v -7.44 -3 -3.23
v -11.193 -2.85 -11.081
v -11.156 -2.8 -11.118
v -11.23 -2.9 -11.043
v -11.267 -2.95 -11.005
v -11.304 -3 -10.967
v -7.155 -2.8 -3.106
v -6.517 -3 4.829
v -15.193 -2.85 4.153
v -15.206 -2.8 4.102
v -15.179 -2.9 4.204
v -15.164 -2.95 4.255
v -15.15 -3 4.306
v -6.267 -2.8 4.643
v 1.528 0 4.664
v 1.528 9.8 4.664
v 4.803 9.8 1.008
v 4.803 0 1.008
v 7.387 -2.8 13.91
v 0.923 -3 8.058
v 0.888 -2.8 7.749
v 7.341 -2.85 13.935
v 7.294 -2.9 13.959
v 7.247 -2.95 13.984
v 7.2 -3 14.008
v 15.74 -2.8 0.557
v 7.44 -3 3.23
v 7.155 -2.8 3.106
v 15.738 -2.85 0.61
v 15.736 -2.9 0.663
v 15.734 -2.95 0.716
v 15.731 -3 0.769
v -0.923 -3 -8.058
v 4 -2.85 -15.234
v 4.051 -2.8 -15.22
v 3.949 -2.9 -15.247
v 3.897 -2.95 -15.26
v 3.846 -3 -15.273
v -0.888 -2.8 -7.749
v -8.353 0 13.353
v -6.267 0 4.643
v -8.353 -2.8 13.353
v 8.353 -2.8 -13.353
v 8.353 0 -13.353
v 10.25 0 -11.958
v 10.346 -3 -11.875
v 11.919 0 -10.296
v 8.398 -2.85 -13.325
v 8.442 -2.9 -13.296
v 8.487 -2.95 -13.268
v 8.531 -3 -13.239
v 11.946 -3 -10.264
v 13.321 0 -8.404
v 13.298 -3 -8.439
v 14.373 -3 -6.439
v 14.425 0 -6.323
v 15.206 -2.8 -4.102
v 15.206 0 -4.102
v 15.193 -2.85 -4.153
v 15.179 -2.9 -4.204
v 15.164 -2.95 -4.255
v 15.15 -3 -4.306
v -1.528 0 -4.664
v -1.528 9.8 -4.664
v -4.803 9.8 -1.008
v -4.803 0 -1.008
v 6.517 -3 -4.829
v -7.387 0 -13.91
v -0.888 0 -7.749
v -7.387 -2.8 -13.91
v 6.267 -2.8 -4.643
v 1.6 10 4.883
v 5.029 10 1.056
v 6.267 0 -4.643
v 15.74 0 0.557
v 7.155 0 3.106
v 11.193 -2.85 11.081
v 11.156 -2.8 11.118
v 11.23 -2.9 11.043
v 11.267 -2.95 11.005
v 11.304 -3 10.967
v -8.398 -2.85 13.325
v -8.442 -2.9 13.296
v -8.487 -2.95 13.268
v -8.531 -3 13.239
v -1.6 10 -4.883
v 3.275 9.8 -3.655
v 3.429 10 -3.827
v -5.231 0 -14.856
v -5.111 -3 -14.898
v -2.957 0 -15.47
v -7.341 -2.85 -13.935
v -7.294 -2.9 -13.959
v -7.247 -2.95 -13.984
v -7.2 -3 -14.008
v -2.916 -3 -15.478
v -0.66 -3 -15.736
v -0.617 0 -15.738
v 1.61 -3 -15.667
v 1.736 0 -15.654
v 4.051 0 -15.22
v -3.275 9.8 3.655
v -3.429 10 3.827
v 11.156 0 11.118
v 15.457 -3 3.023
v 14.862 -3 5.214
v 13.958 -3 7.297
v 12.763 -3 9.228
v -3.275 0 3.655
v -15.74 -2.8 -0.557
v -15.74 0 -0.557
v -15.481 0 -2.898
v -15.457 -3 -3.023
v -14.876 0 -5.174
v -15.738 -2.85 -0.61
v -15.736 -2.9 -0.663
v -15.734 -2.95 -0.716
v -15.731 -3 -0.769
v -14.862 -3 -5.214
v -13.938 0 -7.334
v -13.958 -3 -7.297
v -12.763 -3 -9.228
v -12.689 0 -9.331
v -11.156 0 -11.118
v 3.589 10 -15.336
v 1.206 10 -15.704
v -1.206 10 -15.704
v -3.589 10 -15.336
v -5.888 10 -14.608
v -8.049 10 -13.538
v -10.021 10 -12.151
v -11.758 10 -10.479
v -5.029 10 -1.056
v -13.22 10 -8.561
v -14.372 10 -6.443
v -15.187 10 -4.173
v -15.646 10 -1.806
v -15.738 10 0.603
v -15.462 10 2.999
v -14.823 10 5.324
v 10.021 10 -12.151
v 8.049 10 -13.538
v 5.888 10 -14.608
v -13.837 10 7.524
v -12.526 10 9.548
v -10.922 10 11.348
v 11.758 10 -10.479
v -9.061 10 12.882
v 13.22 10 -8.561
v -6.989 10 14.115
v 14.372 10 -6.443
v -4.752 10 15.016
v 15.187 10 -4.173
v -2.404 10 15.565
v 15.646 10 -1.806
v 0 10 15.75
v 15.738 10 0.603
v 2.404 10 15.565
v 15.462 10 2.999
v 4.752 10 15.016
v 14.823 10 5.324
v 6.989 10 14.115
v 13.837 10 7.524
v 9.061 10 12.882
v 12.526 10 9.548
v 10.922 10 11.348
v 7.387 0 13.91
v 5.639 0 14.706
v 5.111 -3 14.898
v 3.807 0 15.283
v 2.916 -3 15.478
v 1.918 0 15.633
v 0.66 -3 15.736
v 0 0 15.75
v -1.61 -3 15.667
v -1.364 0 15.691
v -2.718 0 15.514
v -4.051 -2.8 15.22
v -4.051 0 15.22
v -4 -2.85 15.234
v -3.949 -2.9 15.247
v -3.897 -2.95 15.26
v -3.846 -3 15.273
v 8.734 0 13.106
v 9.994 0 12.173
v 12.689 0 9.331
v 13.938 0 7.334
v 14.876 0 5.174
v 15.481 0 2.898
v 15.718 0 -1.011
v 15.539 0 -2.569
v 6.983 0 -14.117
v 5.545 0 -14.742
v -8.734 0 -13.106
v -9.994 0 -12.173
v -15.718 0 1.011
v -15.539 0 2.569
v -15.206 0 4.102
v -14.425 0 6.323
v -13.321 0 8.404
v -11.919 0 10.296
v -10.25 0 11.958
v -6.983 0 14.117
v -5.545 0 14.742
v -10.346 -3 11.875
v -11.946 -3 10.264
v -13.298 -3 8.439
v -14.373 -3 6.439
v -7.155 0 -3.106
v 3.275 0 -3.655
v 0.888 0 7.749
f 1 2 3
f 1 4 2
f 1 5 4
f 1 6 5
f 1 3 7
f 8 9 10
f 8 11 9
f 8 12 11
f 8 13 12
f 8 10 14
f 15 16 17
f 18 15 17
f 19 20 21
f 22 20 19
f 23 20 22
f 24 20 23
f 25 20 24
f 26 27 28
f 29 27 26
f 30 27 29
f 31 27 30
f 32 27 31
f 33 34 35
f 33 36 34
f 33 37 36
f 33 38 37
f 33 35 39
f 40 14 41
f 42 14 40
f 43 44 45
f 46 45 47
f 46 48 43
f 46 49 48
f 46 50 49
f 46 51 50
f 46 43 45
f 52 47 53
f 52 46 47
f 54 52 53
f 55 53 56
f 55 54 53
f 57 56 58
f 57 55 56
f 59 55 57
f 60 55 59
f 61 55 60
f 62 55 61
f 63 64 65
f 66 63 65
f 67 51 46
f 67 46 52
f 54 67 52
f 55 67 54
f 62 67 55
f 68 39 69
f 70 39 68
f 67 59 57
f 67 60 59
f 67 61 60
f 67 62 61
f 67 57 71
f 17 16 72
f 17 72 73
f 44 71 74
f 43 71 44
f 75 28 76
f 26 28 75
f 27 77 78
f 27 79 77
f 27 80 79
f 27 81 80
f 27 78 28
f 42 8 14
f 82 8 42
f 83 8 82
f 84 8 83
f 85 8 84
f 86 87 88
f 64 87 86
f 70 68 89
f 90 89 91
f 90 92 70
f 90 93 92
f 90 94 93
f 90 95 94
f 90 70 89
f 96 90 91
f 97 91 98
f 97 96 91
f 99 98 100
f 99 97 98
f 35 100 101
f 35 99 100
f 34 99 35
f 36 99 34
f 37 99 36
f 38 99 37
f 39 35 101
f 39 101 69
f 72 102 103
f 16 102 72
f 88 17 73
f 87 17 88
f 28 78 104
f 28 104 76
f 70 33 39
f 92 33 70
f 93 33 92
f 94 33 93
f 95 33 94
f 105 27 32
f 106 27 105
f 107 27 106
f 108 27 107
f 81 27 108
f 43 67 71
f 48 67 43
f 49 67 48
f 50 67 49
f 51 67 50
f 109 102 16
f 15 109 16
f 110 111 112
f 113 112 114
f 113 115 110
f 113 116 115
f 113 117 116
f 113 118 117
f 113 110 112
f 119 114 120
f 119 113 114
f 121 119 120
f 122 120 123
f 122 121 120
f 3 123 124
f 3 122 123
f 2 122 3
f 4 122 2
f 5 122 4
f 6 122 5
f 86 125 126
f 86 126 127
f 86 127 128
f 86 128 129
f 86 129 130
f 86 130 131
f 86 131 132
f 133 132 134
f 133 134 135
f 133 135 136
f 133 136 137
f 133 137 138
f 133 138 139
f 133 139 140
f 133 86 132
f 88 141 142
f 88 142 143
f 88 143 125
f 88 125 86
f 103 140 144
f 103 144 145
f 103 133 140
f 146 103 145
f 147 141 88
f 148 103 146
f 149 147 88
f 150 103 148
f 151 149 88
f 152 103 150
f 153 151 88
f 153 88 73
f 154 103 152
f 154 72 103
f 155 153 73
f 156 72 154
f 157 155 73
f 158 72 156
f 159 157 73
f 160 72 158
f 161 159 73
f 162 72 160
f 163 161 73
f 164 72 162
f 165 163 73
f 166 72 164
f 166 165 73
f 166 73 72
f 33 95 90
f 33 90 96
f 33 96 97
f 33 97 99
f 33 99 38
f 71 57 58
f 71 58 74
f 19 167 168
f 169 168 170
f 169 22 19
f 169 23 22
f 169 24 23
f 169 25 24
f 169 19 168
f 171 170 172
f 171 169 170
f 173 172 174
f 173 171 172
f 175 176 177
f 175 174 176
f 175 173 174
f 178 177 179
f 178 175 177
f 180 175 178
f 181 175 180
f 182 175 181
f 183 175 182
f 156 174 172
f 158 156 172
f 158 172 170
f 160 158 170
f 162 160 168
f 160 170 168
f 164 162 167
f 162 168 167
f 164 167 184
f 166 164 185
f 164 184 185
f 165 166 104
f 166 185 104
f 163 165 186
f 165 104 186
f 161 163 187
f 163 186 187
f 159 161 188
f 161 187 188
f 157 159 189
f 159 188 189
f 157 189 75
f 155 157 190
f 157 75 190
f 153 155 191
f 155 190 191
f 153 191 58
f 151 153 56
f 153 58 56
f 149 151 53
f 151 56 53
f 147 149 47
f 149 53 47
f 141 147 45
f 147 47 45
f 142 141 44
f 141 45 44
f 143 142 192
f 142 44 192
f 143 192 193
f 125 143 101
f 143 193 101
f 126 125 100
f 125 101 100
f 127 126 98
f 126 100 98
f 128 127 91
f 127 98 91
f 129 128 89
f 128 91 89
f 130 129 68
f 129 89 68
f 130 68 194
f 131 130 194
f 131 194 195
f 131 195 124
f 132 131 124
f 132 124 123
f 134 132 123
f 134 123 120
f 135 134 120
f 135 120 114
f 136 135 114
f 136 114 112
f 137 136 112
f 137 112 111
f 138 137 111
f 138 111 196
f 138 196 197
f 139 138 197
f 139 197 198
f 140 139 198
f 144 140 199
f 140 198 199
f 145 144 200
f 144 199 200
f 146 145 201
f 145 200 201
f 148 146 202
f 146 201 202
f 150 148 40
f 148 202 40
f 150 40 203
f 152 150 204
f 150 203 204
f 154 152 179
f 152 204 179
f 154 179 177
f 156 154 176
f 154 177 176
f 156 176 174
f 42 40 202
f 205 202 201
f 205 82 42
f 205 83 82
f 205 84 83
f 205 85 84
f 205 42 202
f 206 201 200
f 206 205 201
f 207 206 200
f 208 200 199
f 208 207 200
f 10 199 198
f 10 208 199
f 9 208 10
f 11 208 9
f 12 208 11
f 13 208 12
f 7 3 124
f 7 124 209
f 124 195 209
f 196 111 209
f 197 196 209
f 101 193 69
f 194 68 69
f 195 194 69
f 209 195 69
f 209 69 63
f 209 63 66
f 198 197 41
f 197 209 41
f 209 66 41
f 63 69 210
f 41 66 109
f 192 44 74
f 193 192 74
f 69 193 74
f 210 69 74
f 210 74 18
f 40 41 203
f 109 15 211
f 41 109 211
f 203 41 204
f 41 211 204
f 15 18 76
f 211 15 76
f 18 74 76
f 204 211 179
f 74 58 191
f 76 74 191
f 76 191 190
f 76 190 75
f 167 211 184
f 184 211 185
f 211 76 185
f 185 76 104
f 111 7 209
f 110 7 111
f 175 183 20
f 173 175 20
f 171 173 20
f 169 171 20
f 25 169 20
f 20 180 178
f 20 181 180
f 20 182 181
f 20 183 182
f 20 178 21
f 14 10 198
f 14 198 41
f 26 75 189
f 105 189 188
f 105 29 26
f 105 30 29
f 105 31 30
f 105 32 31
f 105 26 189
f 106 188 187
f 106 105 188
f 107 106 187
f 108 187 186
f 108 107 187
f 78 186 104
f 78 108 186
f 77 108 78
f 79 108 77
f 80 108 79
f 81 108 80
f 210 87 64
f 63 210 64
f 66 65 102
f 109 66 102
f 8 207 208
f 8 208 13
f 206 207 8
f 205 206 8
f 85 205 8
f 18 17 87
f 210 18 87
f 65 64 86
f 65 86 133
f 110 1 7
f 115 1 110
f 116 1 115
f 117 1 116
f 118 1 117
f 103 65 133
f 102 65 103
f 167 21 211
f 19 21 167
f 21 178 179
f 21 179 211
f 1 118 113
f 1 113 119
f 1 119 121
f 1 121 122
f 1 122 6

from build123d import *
from build123d.topology import SkipClean

# Parameters (mm, degrees)
SKETCH1_R           = 15.75
BOSS_EXTRUDE1_DEPTH = 10
CUT_EXTRUDE1_DEPTH  = 10
BOSS_EXTRUDE2_START = 3
BOSS_EXTRUDE2_DEPTH = 3
CHAMFER1_SIZE       = 0.2


with BuildPart() as part:
    # Sketch1 → Boss-Extrude1 (new body)
    with BuildSketch(Plane(origin=(0, 0, 0), x_dir=(1, 0, 0), z_dir=(0, 1, 0))):
        with Locations(Location((0, 0, 0), (0, 0, 270))):
            Circle(SKETCH1_R)
    extrude(amount=BOSS_EXTRUDE1_DEPTH)

    # Sketch2 → Cut-Extrude1 (cut)
    with BuildSketch(Plane(origin=(0, 10, 0), x_dir=(1, 0, 0), z_dir=(0, 1, 0))):
        Polygon((3.274663124, 3.655121716), (-1.528096697, 4.663502312), (-4.802759822, 1.008380597), (-3.274663124, -3.655121716), (1.528096697, -4.663502312), (4.802759822, -1.008380597), align=None)
    extrude(amount=-CUT_EXTRUDE1_DEPTH, mode=Mode.SUBTRACT)

    # Sketch3 → Boss-Extrude2 (add)
    with SkipClean():  # the faces are left unmerged after this step: merging them gives an invalid solid
        with BuildSketch(Plane.XZ.offset(BOSS_EXTRUDE2_START)):
            with BuildLine():
                Line((-11.155612536, -11.118219684), (-7.154915715, -3.105991164))
                Line((-7.154915715, -3.105991164), (-15.740134193, -0.557382799))
                ThreePointArc((-15.740134193, -0.557382799), (-14.447425963, -6.271712927), (-11.155612536, -11.118219684))
            make_face()
            with BuildLine():
                Line((-0.887590606, -7.749334353), (-7.387359433, -13.910047469))
                ThreePointArc((-7.387359433, -13.910047469), (-1.792250262, -15.647694367), (4.050854423, -15.220153693))
                Line((4.050854423, -15.220153693), (-0.887590606, -7.749334353))
            make_face()
            with BuildLine():
                Line((6.267325109, -4.643343189), (8.35277476, -13.352664671))
                ThreePointArc((8.35277476, -13.352664671), (12.655175702, -9.37598144), (15.206466959, -4.101934009))
                Line((15.206466959, -4.101934009), (6.267325109, -4.643343189))
            make_face()
            with BuildLine():
                ThreePointArc((15.740134193, 0.557382799), (14.447425963, 6.271712927), (11.155612536, 11.118219684))
                Line((11.155612536, 11.118219684), (7.154915715, 3.105991164))
                Line((7.154915715, 3.105991164), (15.740134193, 0.557382799))
            make_face()
            with BuildLine():
                ThreePointArc((7.387359433, 13.910047469), (1.792250262, 15.647694367), (-4.050854423, 15.220153693))
                Line((-4.050854423, 15.220153693), (0.887590606, 7.749334353))
                Line((0.887590606, 7.749334353), (7.387359433, 13.910047469))
            make_face()
            with BuildLine():
                ThreePointArc((-8.35277476, 13.352664671), (-12.655175702, 9.37598144), (-15.206466959, 4.101934009))
                Line((-15.206466959, 4.101934009), (-6.267325109, 4.643343189))
                Line((-6.267325109, 4.643343189), (-8.35277476, 13.352664671))
            make_face()
        extrude(amount=-BOSS_EXTRUDE2_DEPTH)

    # Chamfer1
    chamfer1_edges = [part.edges().sort_by_distance(p)[0] for p in [
        (4.038711473, 10, -1.323370559),
        (0.873283214, 10, -4.159312014),
        (-3.16542826, 10, -2.835941455),
        (-4.038711473, 10, 1.323370559),
        (-0.873283214, 10, 4.159312014),
        (3.16542826, 10, 2.835941455),
        (-9.155264126, -3, -7.112105424),
        (-11.447524954, -3, -1.831686981),
        (1.581631909, -3, -11.484744023),
        (-4.13747502, -3, -10.829690911),
        (10.736896034, -3, -4.372638599),
        (7.310049935, -3, -8.99800393),
        (9.155264126, -3, 7.112105424),
        (11.447524954, -3, 1.831686981),
        (-1.581631909, -3, 11.484744023),
        (4.13747502, -3, 10.829690911),
        (-10.736896034, -3, 4.372638599),
        (-7.310049935, -3, 8.99800393),
    ]]
    chamfer(chamfer1_edges, length=CHAMFER1_SIZE)


solid = part.part
